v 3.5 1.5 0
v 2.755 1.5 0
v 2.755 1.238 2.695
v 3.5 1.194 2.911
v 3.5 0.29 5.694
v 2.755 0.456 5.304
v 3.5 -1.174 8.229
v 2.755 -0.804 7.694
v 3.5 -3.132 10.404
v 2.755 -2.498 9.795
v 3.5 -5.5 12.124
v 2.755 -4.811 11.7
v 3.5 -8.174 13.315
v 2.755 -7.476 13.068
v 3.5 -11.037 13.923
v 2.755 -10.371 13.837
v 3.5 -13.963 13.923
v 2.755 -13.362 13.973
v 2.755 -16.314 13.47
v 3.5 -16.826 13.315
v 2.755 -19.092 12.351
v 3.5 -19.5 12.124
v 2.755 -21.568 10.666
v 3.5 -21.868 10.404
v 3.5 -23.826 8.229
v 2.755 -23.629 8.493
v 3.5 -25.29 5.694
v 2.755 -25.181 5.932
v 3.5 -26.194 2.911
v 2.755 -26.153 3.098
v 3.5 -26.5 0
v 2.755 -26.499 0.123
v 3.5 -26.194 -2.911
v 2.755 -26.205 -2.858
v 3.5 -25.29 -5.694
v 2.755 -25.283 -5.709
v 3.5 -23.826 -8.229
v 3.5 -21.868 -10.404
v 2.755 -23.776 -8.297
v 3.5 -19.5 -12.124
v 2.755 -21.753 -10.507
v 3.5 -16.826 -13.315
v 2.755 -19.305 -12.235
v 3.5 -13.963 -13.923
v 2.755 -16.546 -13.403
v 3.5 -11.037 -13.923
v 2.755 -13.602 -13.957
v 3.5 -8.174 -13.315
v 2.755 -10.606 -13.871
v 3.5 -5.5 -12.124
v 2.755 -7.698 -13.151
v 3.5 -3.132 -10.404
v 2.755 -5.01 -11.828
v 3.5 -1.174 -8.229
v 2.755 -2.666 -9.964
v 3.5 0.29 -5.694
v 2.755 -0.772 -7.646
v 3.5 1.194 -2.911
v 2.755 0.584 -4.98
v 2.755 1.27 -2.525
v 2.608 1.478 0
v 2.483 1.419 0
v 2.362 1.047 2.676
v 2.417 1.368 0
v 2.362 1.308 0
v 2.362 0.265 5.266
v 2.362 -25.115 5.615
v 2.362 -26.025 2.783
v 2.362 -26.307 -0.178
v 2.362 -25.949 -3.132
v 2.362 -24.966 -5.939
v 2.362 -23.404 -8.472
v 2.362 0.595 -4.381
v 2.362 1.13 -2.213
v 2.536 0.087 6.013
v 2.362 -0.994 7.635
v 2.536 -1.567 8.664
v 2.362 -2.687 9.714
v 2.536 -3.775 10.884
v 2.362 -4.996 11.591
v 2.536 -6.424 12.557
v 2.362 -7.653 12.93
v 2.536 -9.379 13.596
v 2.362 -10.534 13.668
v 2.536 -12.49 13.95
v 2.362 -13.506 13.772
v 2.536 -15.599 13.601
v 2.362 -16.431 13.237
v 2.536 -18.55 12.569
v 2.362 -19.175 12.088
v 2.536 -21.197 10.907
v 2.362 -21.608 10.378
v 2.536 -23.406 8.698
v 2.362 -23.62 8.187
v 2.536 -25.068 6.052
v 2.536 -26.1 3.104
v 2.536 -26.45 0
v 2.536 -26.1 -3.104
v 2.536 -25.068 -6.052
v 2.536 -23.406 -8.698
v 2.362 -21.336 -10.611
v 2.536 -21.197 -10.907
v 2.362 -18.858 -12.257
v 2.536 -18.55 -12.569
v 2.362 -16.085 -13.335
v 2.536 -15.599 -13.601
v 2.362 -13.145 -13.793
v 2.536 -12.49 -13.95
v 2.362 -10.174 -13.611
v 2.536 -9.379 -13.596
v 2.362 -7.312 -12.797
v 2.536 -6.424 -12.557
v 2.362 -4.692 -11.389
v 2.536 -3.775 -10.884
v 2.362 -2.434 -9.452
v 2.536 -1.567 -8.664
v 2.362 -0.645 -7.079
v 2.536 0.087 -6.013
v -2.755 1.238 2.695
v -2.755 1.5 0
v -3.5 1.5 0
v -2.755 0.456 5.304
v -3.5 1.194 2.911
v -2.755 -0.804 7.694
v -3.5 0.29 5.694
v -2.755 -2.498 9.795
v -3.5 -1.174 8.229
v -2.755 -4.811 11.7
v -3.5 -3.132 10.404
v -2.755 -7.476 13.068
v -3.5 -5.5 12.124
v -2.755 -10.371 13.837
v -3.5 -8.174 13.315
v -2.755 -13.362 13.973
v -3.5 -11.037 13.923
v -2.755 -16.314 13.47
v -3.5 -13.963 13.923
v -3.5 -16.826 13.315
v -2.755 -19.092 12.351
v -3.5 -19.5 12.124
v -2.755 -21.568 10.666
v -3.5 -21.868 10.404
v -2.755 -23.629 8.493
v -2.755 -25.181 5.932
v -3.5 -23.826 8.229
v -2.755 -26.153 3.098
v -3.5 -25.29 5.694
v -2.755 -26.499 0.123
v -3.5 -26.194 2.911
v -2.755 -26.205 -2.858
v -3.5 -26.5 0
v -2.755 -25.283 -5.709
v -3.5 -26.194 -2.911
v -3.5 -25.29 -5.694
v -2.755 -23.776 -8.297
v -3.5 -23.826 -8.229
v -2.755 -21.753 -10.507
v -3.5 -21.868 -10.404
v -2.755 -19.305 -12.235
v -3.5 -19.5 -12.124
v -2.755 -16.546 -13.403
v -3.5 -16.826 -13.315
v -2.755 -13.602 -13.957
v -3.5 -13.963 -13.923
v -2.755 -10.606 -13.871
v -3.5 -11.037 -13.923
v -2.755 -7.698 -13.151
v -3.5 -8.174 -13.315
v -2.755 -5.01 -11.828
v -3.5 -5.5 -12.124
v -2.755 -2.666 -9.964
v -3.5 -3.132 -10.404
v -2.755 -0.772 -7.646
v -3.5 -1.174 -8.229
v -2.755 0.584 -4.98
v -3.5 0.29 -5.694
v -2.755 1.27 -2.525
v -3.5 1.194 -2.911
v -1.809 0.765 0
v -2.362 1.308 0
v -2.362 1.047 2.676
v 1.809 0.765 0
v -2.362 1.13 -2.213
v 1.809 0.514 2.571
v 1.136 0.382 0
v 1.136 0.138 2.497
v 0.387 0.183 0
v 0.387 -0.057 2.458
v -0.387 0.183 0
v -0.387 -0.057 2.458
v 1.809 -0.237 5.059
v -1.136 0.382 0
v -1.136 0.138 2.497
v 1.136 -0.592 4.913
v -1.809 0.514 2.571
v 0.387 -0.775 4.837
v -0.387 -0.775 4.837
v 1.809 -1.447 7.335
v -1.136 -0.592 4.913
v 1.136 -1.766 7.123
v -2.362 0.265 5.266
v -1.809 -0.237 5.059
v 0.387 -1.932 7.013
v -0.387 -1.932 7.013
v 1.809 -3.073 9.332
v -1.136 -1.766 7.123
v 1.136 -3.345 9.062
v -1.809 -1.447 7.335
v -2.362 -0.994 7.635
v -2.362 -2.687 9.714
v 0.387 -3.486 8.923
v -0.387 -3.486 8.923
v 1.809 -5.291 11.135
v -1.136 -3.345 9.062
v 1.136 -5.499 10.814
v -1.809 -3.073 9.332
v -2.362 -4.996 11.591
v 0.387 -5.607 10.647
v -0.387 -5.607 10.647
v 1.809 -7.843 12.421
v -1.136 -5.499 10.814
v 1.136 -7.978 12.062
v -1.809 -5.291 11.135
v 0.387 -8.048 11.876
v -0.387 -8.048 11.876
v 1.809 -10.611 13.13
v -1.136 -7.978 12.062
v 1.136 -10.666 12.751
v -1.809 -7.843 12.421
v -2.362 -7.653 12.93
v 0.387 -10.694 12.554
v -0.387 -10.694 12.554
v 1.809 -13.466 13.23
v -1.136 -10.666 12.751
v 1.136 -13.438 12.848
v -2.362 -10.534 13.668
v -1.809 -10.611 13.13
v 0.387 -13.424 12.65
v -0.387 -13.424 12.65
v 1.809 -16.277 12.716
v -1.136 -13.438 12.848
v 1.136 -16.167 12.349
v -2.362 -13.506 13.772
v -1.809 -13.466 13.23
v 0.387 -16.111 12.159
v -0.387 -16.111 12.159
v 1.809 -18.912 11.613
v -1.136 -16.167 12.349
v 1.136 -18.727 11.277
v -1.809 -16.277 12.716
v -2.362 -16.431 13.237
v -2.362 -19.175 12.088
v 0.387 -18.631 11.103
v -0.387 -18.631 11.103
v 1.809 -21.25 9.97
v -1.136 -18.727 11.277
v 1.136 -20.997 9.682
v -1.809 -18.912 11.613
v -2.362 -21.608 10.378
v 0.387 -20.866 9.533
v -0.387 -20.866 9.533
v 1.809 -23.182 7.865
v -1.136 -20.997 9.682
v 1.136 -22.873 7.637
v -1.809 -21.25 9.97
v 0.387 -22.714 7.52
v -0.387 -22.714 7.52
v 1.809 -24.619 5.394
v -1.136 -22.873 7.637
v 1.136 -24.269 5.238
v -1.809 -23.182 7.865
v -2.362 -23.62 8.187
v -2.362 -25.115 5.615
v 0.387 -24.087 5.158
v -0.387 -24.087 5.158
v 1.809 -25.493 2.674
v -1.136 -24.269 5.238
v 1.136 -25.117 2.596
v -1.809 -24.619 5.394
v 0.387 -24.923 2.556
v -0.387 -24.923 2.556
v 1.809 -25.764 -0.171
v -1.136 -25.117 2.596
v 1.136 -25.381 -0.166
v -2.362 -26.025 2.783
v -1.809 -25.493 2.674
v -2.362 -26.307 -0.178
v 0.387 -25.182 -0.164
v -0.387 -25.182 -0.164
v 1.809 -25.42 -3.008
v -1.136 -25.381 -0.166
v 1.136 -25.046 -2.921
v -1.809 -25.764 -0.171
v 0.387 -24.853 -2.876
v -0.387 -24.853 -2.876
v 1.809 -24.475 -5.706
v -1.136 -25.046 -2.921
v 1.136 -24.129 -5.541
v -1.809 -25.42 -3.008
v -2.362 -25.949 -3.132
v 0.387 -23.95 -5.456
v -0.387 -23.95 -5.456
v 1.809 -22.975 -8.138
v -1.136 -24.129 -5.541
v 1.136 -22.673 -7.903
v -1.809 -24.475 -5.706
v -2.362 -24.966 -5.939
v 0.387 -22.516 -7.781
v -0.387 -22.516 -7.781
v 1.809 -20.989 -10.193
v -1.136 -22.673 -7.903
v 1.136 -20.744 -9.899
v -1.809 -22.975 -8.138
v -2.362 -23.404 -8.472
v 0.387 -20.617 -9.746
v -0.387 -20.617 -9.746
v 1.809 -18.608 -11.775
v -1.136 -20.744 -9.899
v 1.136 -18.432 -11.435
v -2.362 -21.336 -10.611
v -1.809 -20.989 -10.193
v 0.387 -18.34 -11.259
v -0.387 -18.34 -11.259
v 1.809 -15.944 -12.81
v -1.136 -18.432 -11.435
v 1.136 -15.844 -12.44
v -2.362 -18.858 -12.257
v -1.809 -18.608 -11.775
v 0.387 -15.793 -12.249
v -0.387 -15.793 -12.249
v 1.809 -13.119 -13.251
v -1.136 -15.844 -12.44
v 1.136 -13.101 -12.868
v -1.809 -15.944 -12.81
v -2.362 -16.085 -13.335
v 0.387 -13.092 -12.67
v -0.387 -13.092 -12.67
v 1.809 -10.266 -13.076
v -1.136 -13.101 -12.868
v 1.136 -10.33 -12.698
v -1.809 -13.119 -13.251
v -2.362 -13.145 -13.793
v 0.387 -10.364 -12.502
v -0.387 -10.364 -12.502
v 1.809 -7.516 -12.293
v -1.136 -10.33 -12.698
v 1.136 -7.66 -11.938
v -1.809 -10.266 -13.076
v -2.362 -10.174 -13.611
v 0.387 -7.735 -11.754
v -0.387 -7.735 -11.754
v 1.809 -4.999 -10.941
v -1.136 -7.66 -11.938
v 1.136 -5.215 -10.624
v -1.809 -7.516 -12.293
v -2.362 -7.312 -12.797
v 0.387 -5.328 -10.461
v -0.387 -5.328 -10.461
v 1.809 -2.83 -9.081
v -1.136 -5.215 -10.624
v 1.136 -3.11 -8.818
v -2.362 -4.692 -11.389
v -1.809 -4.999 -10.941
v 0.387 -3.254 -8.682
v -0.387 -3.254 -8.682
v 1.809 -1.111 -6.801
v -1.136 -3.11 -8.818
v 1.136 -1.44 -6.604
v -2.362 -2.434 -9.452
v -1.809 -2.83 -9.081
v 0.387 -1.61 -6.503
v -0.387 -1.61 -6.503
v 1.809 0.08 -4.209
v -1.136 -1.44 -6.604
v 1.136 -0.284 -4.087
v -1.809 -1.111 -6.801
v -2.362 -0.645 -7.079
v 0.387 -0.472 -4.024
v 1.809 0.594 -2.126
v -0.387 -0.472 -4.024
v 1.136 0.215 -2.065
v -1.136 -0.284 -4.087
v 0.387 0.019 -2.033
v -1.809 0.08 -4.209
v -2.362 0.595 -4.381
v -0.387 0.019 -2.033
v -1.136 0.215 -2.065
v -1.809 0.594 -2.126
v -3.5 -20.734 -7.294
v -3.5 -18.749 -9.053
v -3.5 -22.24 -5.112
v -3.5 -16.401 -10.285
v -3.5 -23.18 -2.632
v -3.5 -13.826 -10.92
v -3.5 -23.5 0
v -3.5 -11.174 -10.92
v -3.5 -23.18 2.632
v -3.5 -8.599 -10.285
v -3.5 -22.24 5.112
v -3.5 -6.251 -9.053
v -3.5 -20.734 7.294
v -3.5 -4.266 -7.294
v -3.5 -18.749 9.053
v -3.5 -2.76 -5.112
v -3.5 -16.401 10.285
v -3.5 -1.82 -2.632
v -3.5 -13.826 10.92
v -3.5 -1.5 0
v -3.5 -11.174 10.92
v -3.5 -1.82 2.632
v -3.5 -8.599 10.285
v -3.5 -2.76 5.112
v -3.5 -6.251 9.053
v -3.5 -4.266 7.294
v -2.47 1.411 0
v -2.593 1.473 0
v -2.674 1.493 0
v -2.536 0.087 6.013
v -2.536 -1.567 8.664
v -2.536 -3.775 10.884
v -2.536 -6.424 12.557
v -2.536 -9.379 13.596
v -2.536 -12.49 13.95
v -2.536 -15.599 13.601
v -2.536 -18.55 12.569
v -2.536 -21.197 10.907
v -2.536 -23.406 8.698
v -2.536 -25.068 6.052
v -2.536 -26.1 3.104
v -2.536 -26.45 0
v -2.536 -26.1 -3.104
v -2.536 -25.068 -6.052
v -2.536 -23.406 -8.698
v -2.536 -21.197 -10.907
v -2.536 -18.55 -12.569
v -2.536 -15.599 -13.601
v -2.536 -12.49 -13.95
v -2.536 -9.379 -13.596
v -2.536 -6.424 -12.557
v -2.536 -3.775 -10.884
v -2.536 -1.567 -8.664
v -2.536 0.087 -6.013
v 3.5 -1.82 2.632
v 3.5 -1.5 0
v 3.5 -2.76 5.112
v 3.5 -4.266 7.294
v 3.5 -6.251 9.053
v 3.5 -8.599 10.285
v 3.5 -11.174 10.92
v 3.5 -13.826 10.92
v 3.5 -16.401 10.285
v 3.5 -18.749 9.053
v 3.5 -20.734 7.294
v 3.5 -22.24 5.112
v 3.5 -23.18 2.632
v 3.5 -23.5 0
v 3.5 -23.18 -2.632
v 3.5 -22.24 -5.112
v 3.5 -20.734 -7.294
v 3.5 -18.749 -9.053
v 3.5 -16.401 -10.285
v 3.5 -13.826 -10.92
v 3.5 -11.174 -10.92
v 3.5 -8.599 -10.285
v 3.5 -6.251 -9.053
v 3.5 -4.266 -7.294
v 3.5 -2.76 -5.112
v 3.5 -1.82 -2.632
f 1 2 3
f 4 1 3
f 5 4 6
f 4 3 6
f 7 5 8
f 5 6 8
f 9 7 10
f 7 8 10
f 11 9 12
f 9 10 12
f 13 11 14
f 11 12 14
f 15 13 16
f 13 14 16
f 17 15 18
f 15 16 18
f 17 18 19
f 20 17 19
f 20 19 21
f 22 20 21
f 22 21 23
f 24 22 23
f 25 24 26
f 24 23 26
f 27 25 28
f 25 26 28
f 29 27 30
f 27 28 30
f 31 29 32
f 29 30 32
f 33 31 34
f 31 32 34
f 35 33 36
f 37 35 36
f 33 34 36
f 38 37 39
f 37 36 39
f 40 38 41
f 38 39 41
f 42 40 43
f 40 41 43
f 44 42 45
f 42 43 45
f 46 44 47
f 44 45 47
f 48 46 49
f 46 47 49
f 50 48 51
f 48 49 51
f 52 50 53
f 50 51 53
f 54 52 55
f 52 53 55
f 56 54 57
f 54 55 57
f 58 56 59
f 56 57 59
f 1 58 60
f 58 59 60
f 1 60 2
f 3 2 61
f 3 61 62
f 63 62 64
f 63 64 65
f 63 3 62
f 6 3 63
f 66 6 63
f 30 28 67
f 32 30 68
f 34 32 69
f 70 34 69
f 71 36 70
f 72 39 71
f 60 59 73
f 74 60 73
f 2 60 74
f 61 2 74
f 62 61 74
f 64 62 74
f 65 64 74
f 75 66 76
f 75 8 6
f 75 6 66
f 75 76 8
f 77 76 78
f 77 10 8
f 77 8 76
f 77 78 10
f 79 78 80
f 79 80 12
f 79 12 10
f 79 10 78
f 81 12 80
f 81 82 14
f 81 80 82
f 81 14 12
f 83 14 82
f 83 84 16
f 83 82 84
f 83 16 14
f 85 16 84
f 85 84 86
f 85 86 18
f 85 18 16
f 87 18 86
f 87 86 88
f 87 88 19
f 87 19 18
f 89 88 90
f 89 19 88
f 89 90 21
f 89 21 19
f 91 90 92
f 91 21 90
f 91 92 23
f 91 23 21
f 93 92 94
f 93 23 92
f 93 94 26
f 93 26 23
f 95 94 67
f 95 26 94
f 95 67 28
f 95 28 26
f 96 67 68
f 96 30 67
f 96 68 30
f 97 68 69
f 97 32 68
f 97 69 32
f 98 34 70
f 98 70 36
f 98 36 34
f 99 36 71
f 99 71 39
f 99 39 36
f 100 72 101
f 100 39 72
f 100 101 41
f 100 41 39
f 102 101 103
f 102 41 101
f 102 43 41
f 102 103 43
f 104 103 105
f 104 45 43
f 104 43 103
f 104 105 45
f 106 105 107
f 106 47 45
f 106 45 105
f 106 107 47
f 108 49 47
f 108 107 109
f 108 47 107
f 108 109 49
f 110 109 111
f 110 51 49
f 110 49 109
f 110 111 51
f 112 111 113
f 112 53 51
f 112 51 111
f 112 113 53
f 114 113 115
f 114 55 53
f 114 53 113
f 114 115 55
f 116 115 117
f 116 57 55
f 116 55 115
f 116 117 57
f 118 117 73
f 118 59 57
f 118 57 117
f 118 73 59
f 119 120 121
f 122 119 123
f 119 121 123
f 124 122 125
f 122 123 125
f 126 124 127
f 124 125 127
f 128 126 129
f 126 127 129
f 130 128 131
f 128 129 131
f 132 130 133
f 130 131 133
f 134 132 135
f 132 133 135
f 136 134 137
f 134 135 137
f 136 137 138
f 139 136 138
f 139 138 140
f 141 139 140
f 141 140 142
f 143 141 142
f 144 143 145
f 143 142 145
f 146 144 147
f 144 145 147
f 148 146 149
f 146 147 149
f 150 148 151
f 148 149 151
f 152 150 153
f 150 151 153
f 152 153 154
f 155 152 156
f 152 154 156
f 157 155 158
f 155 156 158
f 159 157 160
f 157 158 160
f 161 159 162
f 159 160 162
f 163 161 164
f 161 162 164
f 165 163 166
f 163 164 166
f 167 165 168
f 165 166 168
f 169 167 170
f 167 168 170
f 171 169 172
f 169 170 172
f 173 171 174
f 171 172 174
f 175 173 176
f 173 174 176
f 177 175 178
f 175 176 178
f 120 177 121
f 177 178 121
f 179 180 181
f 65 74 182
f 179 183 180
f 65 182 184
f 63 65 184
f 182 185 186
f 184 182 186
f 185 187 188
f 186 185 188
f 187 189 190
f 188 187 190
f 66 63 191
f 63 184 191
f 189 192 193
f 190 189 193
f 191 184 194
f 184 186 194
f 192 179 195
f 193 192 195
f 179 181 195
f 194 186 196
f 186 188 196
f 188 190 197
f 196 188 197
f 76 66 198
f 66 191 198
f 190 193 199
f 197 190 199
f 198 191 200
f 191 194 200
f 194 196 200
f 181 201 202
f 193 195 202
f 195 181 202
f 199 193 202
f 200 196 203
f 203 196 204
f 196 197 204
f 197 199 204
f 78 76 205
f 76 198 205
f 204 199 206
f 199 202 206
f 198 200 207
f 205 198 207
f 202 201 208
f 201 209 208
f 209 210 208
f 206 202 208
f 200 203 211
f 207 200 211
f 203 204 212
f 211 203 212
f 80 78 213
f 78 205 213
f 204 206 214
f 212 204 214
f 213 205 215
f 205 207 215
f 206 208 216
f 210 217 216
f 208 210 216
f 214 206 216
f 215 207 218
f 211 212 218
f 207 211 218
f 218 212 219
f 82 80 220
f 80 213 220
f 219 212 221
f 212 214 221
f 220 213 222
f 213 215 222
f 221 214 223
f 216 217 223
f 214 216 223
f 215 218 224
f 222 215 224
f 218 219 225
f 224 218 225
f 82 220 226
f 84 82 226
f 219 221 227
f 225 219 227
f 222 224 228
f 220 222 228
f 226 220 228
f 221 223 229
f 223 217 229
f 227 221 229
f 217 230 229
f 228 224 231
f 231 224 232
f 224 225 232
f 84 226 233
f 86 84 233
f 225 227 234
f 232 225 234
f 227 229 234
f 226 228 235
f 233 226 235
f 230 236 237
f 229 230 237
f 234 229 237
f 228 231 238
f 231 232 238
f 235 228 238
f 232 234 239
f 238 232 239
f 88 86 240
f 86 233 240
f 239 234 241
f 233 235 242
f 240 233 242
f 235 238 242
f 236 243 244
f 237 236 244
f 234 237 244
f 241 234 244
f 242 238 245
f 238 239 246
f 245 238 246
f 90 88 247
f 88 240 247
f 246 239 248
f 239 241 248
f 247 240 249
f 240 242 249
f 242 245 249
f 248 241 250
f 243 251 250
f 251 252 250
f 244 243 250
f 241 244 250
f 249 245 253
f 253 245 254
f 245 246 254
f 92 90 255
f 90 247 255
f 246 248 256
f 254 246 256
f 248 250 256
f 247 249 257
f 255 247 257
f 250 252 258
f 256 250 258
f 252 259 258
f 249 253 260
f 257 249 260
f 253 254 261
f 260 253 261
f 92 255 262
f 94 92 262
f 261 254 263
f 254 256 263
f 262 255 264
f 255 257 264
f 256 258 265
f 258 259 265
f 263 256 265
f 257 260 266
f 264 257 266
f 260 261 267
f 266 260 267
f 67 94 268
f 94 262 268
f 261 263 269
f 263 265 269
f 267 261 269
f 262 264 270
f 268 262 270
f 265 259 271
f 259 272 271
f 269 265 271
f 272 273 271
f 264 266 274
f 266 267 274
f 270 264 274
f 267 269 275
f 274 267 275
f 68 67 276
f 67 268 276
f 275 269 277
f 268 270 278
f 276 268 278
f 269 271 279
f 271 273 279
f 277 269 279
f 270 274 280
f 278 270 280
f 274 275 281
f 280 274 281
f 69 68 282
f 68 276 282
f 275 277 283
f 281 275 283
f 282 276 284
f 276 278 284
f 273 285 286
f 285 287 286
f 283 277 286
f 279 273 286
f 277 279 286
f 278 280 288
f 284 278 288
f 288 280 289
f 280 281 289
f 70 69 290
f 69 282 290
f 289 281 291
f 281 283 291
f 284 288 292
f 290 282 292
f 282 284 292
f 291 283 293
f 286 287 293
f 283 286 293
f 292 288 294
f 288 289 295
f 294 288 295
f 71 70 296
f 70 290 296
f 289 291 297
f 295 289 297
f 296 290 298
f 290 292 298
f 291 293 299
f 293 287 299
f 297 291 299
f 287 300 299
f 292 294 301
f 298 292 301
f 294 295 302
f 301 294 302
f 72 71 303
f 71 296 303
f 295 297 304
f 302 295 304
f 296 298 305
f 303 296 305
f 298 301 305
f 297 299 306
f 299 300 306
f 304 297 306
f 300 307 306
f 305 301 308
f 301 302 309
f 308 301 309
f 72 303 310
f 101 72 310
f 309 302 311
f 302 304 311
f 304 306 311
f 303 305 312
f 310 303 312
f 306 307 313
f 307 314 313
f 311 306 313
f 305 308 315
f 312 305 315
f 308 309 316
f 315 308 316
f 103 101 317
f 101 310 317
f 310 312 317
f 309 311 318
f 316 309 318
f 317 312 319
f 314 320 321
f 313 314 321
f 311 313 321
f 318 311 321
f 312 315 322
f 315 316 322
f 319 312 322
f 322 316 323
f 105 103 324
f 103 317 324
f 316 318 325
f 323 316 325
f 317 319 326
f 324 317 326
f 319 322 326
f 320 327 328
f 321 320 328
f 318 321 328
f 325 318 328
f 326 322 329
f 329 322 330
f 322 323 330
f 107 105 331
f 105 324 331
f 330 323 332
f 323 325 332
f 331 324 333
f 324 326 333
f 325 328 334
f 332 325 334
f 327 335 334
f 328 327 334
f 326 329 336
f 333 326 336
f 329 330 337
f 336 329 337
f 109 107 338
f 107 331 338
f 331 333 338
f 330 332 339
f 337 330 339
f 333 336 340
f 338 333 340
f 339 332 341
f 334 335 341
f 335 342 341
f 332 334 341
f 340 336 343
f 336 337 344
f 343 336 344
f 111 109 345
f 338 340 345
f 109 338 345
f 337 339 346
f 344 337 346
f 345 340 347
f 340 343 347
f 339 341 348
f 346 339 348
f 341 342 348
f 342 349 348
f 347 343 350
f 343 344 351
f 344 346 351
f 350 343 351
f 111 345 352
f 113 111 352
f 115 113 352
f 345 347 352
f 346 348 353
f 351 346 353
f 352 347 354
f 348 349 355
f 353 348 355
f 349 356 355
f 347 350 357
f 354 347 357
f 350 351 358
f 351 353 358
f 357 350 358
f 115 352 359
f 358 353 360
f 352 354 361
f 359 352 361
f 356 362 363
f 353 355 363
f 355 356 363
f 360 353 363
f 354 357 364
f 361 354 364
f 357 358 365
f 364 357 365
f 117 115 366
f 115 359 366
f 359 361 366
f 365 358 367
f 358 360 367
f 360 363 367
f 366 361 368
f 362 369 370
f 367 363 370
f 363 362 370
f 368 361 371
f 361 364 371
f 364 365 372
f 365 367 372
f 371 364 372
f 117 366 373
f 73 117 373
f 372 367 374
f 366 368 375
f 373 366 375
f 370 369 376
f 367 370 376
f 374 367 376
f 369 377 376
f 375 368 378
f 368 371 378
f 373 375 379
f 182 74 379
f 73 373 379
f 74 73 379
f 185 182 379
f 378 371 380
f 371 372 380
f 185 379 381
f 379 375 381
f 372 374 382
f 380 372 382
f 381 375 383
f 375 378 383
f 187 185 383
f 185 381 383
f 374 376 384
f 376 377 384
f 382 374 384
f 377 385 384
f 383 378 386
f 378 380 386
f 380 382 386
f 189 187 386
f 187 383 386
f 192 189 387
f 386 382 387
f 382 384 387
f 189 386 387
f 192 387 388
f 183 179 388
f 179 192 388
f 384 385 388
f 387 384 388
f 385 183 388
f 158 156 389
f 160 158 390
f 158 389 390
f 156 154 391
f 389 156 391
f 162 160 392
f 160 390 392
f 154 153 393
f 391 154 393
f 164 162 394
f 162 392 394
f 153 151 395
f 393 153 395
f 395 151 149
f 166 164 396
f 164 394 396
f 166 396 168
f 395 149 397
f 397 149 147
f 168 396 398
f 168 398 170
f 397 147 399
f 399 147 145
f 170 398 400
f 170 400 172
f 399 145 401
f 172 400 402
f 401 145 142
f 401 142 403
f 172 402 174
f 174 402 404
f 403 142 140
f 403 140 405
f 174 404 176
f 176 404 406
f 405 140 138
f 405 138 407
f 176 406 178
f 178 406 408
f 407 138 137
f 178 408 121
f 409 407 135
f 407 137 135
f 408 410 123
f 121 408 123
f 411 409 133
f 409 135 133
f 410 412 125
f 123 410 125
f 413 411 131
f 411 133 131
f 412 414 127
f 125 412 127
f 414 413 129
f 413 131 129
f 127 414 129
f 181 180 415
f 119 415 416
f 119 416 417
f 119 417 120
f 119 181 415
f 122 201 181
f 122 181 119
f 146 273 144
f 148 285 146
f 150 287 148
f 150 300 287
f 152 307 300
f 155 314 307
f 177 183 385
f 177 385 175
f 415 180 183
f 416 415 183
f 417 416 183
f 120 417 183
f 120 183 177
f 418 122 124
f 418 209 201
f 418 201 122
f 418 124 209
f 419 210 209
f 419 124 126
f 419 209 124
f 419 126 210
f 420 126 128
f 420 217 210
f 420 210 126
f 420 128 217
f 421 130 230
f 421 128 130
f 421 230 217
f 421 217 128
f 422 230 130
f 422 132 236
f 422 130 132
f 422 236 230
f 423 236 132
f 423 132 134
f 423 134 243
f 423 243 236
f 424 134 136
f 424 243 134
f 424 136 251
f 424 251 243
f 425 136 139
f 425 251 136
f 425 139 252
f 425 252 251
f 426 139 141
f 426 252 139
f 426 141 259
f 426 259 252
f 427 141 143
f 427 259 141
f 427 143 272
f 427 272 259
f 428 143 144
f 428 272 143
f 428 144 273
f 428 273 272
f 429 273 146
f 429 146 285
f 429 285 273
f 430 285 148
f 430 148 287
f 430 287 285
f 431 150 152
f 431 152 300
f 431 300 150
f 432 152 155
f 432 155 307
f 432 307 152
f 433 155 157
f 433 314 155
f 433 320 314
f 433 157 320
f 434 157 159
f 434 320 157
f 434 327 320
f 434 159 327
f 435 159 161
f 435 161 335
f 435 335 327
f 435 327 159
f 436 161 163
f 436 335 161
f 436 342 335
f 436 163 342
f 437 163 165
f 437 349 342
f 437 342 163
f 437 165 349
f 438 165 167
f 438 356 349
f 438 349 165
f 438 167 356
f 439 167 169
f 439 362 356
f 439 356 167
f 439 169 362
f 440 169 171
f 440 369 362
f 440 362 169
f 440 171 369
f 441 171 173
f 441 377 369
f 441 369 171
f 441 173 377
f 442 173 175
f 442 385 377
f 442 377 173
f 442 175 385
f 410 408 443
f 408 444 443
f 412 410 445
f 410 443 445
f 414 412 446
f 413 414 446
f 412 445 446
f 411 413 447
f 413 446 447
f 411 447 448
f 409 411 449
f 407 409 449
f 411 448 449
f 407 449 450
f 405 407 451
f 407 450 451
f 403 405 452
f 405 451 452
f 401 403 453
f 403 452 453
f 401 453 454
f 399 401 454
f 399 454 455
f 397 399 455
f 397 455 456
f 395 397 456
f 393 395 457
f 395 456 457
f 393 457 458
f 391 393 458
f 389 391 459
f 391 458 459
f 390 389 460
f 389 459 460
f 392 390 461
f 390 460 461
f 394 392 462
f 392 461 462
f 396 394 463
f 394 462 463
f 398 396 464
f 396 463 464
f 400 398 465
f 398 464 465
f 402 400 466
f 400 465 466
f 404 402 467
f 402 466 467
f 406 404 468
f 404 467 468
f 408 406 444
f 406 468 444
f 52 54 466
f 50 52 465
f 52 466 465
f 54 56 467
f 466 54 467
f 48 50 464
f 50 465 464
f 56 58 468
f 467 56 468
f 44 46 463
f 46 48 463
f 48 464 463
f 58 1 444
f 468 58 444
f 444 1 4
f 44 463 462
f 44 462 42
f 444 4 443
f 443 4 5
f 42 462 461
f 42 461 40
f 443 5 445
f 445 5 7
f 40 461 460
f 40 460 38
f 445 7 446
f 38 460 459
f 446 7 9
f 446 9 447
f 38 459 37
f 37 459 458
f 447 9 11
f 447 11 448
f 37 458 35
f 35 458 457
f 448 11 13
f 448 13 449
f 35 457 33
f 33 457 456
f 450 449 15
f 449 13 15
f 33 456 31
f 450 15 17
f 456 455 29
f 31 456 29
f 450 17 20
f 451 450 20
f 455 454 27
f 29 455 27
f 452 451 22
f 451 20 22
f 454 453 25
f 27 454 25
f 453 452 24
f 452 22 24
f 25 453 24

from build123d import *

# Parameters (mm, degrees)
F2_R = 0.5


with BuildPart() as f1:
    # F0 (on Top) → F1 (revolve)
    with BuildSketch(Plane.XY):
        with BuildLine():
            Line((-3.5, -1.5), (3.5, -1.5))
            Line((3.5, -1.5), (3.5, 1.5))
            Line((3.5, 1.5), (2.5, 1.5))
            ThreePointArc((2.5, 1.5), (0, 0.1583123952), (-2.5, 1.5))
            Line((-2.5, 1.5), (-3.5, 1.5))
            Line((-3.5, 1.5), (-3.5, -1.5))
        make_face()
    revolve(axis=Axis((0, -12.5, 0), (1, 0, 0)))

    # F2
    f2_edges = [f1.edges().sort_by_distance(p)[0] for p in [
        (-2.5, -26.5, 0),
        (2.5, -26.5, 0),
    ]]
    fillet(f2_edges, radius=F2_R)


solid = f1.part
